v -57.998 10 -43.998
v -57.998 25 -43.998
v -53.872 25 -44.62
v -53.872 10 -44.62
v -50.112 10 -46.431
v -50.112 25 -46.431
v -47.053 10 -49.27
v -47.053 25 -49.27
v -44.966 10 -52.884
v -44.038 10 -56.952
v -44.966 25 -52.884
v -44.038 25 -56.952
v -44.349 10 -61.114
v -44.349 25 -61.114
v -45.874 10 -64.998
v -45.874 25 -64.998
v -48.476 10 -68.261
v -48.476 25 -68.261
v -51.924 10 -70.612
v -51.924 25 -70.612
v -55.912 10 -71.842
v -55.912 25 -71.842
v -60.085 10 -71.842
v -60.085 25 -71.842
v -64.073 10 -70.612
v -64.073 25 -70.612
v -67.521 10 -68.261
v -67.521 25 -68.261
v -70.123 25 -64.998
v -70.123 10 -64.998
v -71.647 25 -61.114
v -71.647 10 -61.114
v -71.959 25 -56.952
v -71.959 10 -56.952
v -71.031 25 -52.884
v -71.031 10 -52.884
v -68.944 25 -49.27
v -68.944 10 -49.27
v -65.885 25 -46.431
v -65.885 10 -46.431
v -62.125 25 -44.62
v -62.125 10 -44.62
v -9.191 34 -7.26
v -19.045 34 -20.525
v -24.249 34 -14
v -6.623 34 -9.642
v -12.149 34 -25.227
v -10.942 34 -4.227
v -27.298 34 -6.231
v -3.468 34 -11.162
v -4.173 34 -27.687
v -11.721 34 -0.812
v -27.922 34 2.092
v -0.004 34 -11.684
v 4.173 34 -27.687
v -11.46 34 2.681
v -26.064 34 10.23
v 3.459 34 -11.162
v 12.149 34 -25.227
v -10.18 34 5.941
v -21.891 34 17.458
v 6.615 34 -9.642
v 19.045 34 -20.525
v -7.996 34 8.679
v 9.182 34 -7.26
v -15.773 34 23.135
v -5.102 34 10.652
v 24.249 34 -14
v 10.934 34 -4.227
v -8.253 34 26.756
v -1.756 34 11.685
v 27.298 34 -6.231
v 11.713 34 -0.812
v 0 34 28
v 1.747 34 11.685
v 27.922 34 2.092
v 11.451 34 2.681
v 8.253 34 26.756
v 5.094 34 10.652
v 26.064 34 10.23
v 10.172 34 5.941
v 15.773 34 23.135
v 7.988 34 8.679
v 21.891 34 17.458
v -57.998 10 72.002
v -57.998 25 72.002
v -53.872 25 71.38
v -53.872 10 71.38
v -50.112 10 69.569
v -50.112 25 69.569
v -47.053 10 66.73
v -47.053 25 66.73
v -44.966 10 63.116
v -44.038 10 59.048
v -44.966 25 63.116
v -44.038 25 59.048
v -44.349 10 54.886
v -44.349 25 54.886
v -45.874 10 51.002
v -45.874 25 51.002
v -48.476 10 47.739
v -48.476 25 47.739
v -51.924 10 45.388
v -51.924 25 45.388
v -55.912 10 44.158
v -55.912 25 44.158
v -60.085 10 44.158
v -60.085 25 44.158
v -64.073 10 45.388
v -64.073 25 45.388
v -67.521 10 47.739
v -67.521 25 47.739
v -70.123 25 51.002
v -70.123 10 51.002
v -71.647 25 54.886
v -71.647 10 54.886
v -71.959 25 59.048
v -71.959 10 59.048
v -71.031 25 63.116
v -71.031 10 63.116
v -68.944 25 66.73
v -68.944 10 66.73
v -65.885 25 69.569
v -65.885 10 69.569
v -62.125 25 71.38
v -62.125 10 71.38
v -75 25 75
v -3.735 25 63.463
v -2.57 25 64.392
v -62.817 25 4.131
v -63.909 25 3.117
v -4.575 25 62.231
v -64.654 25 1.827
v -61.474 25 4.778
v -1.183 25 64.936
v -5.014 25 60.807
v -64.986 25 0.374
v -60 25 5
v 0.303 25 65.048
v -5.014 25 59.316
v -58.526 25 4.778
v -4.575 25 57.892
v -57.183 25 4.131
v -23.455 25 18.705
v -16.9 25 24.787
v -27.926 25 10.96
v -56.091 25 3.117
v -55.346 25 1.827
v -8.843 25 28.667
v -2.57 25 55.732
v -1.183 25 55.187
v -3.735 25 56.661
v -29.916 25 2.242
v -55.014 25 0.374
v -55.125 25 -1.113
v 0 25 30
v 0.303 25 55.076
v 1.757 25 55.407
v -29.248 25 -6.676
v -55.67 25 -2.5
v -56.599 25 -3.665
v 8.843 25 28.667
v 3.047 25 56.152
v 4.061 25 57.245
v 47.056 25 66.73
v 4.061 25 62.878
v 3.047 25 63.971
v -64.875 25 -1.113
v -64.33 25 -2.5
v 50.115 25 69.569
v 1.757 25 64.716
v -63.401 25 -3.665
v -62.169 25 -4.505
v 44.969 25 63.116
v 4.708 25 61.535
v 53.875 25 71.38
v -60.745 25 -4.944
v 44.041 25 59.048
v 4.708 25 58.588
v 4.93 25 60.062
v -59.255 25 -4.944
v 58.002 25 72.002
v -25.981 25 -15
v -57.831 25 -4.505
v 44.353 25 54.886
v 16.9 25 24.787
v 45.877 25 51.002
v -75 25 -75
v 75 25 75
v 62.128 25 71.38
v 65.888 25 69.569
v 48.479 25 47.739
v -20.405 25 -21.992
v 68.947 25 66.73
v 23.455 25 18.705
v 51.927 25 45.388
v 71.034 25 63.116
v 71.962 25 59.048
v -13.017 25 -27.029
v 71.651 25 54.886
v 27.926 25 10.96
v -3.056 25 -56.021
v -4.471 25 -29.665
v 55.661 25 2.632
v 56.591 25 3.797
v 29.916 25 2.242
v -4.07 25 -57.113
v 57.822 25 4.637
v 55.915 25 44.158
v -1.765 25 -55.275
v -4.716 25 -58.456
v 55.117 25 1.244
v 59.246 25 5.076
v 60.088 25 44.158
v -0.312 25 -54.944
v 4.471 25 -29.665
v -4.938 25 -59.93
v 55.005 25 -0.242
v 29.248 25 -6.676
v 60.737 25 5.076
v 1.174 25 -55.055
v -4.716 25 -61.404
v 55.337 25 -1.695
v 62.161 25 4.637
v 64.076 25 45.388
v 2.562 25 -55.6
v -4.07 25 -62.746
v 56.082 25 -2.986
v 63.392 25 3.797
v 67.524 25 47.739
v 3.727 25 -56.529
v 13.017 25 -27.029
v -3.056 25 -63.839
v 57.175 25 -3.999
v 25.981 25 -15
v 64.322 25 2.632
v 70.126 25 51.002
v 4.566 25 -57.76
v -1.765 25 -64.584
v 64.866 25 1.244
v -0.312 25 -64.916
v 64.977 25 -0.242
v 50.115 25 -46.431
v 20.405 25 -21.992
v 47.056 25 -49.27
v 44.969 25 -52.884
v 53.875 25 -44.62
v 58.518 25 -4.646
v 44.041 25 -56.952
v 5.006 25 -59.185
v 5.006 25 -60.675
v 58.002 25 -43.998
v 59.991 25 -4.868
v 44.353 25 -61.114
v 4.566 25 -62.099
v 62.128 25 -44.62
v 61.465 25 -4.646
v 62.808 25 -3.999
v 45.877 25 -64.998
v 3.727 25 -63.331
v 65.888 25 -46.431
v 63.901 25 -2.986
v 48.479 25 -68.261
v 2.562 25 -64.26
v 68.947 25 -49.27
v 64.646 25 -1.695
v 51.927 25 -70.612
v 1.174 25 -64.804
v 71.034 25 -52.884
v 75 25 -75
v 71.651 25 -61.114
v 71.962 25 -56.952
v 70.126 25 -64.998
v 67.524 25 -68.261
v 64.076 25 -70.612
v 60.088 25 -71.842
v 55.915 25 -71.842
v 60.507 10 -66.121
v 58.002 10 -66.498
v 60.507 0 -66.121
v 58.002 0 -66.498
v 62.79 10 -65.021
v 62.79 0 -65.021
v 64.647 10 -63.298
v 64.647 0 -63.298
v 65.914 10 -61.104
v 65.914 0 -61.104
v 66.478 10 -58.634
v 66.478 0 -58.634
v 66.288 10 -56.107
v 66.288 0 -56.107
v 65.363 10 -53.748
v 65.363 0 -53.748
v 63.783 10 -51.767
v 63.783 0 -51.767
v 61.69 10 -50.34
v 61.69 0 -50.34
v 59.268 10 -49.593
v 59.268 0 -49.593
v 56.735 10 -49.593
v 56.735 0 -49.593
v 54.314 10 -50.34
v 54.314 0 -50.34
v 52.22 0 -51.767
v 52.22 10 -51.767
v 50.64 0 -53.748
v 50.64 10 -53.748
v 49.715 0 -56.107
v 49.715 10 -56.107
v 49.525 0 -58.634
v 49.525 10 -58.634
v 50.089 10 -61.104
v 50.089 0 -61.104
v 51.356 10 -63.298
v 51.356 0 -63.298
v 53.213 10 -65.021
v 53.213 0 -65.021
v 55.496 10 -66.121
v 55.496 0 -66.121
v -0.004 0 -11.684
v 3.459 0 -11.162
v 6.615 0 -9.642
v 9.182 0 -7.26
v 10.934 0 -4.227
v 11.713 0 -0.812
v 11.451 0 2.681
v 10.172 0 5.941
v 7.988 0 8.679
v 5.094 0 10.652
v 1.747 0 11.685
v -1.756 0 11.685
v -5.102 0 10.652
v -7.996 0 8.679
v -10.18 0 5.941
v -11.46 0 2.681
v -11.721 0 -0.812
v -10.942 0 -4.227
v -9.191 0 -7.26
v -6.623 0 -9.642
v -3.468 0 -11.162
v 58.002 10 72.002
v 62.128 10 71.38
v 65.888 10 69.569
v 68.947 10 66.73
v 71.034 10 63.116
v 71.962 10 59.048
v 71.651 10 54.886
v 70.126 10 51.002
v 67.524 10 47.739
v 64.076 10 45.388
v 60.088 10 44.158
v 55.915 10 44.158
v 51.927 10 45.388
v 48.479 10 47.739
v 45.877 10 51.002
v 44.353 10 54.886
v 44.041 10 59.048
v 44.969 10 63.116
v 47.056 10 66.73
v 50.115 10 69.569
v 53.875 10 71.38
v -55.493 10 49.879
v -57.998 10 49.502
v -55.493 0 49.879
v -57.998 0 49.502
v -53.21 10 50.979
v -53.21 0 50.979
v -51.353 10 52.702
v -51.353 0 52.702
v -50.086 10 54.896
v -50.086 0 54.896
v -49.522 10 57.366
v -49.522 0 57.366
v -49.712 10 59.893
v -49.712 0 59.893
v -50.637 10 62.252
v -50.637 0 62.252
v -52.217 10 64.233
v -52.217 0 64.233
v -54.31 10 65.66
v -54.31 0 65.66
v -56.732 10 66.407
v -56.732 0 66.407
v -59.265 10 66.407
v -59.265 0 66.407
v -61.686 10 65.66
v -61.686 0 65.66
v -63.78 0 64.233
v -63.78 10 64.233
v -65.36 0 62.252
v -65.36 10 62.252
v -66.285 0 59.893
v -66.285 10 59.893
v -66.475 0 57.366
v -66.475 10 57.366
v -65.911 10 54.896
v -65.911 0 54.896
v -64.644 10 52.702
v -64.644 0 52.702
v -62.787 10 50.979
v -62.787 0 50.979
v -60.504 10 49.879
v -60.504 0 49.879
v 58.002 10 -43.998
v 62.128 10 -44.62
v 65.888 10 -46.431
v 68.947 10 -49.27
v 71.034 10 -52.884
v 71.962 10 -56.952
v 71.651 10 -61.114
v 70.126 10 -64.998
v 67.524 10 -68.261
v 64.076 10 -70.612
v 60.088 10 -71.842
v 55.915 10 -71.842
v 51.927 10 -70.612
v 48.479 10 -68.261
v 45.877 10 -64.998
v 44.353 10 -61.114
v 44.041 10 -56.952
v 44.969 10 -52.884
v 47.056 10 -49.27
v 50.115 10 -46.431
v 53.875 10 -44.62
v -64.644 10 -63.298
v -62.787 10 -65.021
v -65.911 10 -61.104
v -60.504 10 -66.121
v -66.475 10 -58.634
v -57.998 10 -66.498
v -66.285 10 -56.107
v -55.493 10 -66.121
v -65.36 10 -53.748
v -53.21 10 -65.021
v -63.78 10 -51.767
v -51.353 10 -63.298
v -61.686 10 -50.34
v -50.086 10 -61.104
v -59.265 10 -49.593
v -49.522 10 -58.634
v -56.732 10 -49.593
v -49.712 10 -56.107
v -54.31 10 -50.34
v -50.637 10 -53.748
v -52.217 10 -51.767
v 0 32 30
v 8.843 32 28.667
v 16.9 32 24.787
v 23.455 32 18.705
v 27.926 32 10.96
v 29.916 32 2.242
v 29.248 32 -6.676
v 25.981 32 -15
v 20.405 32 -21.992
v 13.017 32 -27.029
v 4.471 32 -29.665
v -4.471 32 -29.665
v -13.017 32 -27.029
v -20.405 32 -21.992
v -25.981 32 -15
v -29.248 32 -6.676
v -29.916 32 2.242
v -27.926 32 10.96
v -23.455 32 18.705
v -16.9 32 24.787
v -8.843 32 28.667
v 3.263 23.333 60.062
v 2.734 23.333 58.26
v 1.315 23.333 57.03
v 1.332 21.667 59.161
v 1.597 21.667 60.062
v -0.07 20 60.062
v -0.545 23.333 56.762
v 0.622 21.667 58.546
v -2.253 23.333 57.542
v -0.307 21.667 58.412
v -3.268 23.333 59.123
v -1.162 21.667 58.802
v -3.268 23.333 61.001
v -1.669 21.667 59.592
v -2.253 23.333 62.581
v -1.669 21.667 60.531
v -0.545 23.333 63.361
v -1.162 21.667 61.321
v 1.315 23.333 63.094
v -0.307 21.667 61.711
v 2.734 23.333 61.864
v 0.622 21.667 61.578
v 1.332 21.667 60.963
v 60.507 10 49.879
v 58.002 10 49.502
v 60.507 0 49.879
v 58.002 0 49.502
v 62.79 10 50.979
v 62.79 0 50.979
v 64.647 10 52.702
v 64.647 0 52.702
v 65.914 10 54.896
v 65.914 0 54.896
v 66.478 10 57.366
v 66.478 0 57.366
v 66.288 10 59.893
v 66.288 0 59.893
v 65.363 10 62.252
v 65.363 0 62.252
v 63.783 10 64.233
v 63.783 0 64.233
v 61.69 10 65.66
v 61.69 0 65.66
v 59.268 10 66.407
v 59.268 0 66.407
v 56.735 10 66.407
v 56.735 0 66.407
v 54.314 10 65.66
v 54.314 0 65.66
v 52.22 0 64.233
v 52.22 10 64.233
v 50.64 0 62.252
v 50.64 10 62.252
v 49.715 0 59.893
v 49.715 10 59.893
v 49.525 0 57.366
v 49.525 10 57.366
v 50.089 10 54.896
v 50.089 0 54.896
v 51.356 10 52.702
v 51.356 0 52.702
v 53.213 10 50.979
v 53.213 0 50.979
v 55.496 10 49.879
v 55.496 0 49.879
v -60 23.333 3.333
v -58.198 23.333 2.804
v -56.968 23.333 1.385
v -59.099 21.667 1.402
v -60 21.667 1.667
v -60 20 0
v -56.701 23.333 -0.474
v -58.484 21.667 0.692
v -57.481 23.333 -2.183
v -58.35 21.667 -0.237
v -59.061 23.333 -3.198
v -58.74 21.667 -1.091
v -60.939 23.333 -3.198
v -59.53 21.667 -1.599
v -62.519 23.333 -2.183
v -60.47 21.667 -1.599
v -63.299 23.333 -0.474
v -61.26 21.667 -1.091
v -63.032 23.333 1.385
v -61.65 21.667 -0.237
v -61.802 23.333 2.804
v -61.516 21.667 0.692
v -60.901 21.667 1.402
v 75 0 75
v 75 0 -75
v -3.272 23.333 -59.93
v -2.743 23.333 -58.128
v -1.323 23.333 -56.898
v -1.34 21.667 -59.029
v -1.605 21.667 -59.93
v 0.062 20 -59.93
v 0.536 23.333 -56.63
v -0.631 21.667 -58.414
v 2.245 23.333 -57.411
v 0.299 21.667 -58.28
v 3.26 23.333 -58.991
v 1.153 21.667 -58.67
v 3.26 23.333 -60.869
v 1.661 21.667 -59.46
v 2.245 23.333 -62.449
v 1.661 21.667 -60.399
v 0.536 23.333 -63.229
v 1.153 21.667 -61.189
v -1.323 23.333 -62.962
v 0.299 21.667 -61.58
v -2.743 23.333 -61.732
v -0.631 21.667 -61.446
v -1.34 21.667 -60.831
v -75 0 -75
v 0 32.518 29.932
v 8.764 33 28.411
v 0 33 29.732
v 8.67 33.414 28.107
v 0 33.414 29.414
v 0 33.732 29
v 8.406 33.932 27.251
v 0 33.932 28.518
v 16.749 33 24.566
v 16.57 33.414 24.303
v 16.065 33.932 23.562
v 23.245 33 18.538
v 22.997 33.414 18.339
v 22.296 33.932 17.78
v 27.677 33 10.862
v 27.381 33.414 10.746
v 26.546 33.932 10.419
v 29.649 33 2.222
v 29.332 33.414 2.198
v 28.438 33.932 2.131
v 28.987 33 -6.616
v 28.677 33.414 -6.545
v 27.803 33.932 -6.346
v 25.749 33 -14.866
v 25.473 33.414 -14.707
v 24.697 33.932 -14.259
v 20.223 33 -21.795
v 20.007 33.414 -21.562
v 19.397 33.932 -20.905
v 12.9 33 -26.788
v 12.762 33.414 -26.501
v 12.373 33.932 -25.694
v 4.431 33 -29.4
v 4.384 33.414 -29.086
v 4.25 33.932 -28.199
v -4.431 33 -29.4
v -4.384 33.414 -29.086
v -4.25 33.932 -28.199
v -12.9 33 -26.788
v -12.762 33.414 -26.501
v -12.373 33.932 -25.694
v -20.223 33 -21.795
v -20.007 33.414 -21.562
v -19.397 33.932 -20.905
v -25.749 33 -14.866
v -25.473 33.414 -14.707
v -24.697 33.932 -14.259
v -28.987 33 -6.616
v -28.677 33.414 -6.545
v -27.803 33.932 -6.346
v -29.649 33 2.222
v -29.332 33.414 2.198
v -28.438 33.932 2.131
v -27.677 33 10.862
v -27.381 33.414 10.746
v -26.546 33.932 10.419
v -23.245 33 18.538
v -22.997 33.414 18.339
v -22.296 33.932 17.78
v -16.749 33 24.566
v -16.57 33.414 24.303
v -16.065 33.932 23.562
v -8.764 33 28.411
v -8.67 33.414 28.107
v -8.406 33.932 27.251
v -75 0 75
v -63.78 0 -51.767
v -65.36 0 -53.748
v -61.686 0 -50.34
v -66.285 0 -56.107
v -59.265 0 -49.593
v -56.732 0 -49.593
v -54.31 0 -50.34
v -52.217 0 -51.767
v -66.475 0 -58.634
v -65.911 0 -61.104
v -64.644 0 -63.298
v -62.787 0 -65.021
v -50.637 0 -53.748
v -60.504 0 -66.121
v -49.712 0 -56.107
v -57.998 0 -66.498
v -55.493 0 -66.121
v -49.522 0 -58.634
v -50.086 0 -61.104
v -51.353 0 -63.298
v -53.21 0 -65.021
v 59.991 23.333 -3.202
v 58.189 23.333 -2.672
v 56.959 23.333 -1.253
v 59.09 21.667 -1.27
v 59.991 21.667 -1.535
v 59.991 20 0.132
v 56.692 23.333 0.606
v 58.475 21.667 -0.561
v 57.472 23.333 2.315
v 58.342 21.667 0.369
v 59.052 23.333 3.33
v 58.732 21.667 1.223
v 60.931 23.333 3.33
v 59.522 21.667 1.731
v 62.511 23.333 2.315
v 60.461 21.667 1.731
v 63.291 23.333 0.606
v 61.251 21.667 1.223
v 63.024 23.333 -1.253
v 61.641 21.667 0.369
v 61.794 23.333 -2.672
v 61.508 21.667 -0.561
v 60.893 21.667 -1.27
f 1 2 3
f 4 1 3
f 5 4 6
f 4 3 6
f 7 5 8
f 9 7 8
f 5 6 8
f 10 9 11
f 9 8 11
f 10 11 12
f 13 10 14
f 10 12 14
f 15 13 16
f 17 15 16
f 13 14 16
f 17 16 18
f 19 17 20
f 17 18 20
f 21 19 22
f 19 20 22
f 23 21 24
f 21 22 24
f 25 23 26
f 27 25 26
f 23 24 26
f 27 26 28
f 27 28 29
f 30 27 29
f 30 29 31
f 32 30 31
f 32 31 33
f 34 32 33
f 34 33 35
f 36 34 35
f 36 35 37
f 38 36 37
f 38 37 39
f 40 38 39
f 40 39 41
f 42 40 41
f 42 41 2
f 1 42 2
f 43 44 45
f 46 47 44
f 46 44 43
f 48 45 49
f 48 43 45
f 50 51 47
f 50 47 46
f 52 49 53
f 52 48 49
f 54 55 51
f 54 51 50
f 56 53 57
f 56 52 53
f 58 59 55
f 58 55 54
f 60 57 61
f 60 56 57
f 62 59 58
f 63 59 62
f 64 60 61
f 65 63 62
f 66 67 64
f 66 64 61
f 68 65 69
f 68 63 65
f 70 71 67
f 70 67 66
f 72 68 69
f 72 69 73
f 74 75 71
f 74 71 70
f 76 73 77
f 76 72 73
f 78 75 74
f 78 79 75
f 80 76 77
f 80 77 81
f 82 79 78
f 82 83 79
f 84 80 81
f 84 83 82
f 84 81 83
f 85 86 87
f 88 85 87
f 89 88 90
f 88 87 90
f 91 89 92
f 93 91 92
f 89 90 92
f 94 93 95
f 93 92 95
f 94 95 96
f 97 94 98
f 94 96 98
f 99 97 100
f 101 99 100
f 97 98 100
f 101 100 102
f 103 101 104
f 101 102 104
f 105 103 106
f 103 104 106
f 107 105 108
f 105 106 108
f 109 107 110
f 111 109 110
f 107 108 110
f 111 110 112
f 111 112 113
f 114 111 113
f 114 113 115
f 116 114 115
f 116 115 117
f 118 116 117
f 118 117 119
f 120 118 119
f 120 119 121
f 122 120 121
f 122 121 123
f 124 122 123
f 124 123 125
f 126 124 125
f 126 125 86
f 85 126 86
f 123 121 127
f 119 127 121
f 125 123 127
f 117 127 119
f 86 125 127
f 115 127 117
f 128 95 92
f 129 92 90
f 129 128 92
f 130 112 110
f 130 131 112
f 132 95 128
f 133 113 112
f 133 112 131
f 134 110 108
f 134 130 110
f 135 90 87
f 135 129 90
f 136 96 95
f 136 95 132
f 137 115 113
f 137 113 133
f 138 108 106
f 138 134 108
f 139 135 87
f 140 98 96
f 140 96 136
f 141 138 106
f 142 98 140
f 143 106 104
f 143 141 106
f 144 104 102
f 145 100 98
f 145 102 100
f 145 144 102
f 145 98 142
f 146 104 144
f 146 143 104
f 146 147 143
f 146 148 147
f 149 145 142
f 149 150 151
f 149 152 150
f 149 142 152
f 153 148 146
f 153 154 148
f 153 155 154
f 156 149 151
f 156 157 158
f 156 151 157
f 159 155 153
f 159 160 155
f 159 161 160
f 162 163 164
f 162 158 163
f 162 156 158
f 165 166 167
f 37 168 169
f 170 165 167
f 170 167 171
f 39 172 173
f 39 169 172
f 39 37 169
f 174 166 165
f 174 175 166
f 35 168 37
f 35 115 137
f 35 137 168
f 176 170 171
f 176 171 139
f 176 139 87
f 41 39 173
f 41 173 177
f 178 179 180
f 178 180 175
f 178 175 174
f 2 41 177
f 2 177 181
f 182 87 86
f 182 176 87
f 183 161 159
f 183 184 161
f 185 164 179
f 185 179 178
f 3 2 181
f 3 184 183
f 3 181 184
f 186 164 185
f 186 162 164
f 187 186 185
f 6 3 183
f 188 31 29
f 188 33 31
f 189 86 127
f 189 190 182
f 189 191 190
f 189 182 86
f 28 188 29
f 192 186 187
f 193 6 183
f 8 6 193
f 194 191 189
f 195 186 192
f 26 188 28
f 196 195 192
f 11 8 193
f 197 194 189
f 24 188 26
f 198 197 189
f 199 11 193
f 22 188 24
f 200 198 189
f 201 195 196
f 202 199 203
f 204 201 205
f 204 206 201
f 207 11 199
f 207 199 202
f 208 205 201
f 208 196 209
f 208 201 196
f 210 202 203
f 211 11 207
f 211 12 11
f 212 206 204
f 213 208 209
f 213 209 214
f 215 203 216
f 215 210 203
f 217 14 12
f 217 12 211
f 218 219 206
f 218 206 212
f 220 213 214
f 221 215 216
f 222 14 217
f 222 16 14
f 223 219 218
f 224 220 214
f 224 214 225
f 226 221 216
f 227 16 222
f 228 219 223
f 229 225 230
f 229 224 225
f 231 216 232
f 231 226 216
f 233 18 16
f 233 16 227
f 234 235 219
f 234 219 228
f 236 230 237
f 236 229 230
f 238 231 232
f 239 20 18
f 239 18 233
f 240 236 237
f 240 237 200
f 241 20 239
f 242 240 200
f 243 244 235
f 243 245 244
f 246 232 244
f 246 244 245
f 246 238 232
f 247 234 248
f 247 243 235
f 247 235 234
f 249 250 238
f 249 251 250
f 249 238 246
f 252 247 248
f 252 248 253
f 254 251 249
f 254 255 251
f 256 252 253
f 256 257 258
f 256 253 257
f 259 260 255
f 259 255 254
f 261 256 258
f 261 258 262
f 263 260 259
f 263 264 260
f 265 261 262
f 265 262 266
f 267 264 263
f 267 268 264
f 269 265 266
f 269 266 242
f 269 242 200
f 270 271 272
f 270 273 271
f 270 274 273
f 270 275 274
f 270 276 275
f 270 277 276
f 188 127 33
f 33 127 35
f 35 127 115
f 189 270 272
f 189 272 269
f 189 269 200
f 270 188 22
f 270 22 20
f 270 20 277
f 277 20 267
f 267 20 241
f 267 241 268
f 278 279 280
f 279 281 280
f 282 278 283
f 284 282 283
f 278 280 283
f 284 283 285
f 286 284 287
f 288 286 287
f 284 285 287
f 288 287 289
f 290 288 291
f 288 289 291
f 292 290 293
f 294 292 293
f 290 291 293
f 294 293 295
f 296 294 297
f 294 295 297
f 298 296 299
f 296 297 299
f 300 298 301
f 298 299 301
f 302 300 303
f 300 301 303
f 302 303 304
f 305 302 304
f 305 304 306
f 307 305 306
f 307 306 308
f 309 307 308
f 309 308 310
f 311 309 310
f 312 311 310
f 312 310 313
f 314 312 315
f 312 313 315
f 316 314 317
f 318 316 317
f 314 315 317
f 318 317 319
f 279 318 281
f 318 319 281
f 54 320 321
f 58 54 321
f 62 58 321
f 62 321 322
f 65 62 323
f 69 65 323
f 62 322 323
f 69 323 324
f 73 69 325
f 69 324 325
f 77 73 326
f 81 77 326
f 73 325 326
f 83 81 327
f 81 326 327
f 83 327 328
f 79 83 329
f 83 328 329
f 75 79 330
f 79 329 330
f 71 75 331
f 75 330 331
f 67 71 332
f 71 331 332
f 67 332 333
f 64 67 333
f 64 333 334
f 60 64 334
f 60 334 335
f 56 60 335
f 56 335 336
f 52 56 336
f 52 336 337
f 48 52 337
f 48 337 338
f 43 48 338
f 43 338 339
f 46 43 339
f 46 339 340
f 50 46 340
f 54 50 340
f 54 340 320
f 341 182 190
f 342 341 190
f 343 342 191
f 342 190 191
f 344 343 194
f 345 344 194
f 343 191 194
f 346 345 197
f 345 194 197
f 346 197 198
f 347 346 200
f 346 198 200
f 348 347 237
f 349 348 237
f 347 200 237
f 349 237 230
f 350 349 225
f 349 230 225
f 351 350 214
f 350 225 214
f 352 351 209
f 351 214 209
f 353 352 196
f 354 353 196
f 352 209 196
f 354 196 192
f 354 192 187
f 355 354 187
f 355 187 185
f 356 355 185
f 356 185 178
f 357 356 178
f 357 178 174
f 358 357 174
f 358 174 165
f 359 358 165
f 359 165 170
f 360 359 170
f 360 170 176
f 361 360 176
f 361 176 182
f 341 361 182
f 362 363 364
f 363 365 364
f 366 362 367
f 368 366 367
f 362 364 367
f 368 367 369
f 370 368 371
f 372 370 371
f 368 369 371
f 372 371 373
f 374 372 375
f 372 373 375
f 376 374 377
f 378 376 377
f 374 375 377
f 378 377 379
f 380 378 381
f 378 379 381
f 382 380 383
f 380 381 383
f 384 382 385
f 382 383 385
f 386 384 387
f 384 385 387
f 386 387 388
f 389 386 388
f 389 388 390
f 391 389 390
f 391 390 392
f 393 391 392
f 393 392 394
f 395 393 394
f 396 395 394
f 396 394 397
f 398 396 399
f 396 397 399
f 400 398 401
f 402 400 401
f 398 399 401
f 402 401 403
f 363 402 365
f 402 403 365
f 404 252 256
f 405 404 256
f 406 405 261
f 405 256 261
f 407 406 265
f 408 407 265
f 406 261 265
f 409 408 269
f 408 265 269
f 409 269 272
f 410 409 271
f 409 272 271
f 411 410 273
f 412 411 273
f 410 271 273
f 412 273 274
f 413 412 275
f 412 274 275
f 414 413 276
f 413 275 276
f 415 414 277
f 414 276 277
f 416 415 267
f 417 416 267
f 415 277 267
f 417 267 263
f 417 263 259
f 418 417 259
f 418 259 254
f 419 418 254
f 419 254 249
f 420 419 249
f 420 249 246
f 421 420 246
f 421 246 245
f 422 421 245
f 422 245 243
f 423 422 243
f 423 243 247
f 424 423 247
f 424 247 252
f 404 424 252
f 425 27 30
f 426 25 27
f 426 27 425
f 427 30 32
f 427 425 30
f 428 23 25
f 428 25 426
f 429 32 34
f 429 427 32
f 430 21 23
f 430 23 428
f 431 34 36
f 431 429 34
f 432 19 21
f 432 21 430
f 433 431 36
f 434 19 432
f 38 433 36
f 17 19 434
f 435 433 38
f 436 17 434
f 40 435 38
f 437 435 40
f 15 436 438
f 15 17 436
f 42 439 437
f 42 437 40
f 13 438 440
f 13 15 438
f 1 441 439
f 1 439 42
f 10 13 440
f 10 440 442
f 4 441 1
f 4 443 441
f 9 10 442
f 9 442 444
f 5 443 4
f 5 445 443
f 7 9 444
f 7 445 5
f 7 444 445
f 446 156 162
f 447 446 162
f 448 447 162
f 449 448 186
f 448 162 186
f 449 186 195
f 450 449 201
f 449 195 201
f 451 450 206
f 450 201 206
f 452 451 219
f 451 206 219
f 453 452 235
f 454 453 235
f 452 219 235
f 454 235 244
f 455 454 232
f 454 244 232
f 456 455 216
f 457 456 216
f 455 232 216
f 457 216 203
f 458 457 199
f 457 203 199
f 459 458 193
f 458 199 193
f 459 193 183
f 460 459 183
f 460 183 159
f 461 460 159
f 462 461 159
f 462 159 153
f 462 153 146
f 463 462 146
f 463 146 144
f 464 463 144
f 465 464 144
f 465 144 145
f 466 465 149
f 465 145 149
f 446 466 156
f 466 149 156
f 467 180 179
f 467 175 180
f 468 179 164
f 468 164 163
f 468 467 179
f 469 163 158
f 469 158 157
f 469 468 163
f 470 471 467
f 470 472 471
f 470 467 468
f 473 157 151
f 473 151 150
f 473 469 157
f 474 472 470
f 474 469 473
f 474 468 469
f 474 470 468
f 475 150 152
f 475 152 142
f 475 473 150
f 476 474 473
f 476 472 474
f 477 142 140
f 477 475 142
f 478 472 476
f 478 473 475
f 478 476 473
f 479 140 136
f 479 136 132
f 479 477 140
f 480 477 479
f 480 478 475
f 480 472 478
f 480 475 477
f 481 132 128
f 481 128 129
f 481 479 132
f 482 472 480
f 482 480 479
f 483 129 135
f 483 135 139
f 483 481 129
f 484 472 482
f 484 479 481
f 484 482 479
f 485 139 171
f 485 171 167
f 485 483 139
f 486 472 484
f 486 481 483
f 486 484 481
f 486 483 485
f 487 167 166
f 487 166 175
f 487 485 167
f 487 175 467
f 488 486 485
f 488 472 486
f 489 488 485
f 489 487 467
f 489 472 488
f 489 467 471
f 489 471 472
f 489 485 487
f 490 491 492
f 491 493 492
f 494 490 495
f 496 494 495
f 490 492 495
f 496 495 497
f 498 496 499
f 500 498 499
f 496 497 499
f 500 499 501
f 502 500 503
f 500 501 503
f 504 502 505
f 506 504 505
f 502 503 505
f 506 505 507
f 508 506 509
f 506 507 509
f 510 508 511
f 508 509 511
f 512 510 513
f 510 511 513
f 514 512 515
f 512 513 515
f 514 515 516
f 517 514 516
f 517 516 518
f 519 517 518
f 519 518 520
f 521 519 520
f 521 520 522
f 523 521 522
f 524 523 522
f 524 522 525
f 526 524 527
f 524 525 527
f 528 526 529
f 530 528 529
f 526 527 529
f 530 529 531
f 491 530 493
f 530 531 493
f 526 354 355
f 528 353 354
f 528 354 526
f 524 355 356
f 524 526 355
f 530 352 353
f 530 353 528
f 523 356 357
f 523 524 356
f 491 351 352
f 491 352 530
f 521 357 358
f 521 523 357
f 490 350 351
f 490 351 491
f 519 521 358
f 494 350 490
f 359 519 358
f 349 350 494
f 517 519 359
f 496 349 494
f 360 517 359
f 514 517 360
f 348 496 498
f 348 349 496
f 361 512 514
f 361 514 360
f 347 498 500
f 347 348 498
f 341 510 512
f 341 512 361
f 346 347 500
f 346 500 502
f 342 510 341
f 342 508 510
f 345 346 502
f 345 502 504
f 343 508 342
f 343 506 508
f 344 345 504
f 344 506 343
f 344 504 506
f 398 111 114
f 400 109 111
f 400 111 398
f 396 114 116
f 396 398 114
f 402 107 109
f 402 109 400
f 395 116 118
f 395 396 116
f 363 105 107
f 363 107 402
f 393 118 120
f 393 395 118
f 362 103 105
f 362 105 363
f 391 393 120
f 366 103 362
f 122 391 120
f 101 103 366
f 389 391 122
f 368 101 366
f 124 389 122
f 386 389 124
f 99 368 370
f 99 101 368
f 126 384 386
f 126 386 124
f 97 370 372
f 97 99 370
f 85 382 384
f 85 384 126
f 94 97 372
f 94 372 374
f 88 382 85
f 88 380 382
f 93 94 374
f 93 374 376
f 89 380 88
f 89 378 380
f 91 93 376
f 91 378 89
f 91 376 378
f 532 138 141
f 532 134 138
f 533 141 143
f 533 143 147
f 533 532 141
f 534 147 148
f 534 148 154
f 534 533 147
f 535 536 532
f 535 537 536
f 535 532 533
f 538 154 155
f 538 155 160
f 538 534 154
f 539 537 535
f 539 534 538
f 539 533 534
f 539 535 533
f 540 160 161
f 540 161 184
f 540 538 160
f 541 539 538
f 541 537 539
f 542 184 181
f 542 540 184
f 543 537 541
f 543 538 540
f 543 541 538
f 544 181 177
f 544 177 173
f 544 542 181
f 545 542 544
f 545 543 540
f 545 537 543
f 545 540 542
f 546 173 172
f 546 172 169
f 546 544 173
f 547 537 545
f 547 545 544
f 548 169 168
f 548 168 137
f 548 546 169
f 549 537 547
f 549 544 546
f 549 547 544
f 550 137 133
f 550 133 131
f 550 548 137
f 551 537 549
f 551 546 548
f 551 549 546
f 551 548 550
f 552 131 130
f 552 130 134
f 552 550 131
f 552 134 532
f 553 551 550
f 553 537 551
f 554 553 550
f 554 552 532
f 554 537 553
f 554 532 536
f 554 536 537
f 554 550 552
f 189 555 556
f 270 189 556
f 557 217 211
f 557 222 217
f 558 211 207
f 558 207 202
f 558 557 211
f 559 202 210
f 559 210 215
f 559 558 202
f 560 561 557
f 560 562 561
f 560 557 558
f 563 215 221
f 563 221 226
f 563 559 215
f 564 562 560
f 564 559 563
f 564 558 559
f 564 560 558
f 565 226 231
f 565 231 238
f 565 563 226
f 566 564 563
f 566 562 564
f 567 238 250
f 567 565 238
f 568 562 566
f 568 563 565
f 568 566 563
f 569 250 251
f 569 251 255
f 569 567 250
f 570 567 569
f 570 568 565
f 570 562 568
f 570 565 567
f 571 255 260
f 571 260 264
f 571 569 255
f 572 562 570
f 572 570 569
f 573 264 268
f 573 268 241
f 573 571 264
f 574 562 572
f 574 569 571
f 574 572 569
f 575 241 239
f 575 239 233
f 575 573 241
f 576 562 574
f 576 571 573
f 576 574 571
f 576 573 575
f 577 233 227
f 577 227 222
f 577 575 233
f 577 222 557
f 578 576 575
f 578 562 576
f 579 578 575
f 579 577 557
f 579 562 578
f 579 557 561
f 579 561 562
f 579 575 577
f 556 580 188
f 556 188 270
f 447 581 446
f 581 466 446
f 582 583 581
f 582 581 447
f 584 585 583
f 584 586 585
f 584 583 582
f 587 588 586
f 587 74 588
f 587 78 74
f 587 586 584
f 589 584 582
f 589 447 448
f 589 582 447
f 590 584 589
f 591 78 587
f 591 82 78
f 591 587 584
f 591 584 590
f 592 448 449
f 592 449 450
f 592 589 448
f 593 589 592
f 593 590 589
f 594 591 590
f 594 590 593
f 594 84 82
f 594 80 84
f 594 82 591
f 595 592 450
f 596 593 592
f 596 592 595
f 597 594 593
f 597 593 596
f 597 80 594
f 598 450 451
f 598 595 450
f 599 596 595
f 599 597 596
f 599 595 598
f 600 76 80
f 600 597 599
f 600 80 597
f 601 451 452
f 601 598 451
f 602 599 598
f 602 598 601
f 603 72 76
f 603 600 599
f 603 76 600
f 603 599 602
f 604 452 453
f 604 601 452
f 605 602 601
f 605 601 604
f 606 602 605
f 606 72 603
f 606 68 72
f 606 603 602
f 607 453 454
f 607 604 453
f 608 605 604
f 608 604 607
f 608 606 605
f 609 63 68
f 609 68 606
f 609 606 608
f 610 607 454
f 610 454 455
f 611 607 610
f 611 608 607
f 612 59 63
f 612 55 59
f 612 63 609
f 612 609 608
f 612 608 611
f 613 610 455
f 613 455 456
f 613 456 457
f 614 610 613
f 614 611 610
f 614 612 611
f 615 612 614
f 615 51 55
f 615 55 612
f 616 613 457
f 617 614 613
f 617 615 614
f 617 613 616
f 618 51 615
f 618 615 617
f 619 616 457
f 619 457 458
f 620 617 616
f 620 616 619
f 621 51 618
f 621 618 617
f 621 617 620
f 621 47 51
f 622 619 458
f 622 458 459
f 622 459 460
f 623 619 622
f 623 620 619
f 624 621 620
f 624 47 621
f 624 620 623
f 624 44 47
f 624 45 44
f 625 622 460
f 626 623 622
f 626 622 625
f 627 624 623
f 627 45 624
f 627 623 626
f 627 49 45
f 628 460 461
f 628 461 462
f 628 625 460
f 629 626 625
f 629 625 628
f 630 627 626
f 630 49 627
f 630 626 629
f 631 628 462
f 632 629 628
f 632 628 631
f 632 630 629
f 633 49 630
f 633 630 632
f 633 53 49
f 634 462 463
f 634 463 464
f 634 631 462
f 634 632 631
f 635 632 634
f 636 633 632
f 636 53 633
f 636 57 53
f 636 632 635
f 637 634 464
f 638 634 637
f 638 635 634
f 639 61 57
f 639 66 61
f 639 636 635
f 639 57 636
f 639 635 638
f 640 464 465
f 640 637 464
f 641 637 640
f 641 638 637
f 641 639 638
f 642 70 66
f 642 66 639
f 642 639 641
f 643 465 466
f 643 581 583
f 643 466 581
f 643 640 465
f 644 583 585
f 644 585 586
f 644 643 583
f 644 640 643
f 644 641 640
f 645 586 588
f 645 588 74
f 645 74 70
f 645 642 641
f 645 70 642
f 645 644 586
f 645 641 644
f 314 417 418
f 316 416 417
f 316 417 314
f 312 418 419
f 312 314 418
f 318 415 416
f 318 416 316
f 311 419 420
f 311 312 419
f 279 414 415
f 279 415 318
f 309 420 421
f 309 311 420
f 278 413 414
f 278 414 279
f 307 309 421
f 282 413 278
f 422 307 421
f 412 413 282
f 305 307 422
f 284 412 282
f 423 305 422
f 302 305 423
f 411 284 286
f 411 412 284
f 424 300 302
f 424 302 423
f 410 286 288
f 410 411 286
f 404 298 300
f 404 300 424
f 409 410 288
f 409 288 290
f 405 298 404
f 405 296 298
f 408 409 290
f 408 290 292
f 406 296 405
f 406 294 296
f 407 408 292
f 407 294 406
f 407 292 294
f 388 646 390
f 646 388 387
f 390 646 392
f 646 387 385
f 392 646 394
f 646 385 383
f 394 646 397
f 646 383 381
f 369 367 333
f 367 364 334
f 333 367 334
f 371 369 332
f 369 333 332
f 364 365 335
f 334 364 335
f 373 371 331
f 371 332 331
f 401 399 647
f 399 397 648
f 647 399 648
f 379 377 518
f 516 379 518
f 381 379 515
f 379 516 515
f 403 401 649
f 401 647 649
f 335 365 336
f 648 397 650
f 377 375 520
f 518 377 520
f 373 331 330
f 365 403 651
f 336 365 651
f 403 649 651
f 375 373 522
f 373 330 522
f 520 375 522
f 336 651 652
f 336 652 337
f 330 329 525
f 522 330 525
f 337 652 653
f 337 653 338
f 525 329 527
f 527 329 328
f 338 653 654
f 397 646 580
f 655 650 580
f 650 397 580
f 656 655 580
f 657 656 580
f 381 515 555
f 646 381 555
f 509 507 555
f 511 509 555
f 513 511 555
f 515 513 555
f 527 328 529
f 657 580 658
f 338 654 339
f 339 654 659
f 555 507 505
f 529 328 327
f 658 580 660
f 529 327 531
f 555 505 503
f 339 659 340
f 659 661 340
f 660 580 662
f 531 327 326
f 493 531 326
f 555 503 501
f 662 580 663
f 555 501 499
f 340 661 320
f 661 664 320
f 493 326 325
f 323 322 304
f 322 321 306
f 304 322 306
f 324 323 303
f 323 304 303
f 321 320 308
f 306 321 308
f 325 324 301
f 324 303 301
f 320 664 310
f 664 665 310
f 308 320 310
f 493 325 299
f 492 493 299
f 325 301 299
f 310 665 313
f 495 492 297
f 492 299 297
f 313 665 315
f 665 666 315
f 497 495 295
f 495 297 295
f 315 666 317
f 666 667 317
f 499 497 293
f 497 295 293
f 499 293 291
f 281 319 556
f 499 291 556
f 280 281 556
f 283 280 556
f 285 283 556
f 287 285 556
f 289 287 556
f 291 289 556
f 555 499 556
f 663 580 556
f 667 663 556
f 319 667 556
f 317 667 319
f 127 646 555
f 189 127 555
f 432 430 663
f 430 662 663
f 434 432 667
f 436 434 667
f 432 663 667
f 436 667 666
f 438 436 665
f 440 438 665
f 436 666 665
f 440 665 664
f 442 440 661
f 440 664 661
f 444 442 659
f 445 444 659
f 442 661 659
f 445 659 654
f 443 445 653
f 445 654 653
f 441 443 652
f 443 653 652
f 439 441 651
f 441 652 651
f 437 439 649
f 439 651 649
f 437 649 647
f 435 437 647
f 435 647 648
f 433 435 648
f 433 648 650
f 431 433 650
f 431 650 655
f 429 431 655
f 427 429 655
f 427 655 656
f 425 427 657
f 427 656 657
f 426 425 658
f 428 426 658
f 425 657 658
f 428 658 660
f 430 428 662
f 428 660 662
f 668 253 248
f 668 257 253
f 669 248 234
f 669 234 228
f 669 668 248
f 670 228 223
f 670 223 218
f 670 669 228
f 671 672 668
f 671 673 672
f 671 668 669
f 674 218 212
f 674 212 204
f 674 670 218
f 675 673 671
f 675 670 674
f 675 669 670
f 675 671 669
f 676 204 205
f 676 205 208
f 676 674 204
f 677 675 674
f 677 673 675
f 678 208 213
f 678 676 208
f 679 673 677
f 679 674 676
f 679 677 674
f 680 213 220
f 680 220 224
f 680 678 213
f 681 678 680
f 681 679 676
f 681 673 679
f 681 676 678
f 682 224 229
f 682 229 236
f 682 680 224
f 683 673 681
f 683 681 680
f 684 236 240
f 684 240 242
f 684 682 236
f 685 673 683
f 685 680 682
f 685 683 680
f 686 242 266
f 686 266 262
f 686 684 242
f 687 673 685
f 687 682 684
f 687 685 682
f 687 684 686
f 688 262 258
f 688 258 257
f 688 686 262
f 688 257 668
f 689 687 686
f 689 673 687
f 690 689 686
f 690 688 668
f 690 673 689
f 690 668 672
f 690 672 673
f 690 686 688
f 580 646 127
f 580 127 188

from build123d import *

# Parameters (mm, degrees)
IZIM2_W                     = 150
IZIM2_H                     = 150
Y_KSEKLIK_EKSTR_ZYON1_DEPTH = 25
IZIM3_R                     = 30
Y_KSEKLIK_EKSTR_ZYON2_DEPTH = 9
RADYUS1_R                   = 2
M25X1_5_DI_LI_DELIK2_D      = 23.5
DELIK1_D                    = 17
DELIK1_CBORE_D              = 28
DELIK1_CBORE_DEPTH          = 15
DAIRESEL_KAPLAMA2_COUNT     = 4


with BuildPart() as part:
    # Çizim2 → Yükseklik-Ekstrüzyon1 (new body)
    with BuildSketch(Plane(origin=(0, 0, 0), x_dir=(1, 0, 0), z_dir=(0, 1, 0))):
        Rectangle(IZIM2_W, IZIM2_H)
    extrude(amount=Y_KSEKLIK_EKSTR_ZYON1_DEPTH)

    # Çizim3 → Yükseklik-Ekstrüzyon2 (add)
    with BuildSketch(Plane(origin=(0, 25, 0), x_dir=(1, 0, 0), z_dir=(0, 1, 0))):
        with Locations(Location((0, 0, 0), (0, 0, 270))):
            Circle(IZIM3_R)
    extrude(amount=Y_KSEKLIK_EKSTR_ZYON2_DEPTH)

    # Radyus1
    radyus1_edges = [part.edges().sort_by_distance(p)[0] for p in [
        (0, 34, -30),
    ]]
    fillet(radyus1_edges, radius=RADYUS1_R)

    # M25x1.5 Dişli Delik2 (through all)
    with Locations(Plane(origin=(-0.00426246, 34, 0.065902754), x_dir=(0, 0, 1), z_dir=(0, 1, 0))):
        with Locations((0, 0)):
            Hole(M25X1_5_DI_LI_DELIK2_D / 2)

    # Delik1 (through all)
    with Locations(Plane(origin=(-57.998400022, 25, -57.998400022), x_dir=(0, 0, 1), z_dir=(0, 1, 0))):
        with Locations((0, 0), (0, 116), (116, 116), (116, 0)):
            CounterBoreHole(DELIK1_D / 2, DELIK1_CBORE_D / 2, DELIK1_CBORE_DEPTH)

    # Çizim8 → Kes-Döndür1 (revolve, cut)
    with BuildSketch(Plane.XY, mode=Mode.PRIVATE) as kes_d_nd_r1_sk:
        Polygon((-65, 25), (-60, 20), (-60, 25), align=None)
    kes_d_nd_r1 = revolve(kes_d_nd_r1_sk.sketch.rotate(Axis((-60, 20, 0), (0, 1, 0)), 90), axis=Axis((-60, 20, 0), (0, 1, 0)), mode=Mode.SUBTRACT)

    # Dairesel Kaplama2: Kes-Döndür1 ×4 about axis
    dairesel_kaplama2_axis = Axis((-0.00426246, 0, 0.065902754), (0, 1, 0))
    for i in range(1, DAIRESEL_KAPLAMA2_COUNT):
        add(kes_d_nd_r1.rotate(dairesel_kaplama2_axis, i * 360 / DAIRESEL_KAPLAMA2_COUNT), mode=Mode.SUBTRACT)


solid = part.part
